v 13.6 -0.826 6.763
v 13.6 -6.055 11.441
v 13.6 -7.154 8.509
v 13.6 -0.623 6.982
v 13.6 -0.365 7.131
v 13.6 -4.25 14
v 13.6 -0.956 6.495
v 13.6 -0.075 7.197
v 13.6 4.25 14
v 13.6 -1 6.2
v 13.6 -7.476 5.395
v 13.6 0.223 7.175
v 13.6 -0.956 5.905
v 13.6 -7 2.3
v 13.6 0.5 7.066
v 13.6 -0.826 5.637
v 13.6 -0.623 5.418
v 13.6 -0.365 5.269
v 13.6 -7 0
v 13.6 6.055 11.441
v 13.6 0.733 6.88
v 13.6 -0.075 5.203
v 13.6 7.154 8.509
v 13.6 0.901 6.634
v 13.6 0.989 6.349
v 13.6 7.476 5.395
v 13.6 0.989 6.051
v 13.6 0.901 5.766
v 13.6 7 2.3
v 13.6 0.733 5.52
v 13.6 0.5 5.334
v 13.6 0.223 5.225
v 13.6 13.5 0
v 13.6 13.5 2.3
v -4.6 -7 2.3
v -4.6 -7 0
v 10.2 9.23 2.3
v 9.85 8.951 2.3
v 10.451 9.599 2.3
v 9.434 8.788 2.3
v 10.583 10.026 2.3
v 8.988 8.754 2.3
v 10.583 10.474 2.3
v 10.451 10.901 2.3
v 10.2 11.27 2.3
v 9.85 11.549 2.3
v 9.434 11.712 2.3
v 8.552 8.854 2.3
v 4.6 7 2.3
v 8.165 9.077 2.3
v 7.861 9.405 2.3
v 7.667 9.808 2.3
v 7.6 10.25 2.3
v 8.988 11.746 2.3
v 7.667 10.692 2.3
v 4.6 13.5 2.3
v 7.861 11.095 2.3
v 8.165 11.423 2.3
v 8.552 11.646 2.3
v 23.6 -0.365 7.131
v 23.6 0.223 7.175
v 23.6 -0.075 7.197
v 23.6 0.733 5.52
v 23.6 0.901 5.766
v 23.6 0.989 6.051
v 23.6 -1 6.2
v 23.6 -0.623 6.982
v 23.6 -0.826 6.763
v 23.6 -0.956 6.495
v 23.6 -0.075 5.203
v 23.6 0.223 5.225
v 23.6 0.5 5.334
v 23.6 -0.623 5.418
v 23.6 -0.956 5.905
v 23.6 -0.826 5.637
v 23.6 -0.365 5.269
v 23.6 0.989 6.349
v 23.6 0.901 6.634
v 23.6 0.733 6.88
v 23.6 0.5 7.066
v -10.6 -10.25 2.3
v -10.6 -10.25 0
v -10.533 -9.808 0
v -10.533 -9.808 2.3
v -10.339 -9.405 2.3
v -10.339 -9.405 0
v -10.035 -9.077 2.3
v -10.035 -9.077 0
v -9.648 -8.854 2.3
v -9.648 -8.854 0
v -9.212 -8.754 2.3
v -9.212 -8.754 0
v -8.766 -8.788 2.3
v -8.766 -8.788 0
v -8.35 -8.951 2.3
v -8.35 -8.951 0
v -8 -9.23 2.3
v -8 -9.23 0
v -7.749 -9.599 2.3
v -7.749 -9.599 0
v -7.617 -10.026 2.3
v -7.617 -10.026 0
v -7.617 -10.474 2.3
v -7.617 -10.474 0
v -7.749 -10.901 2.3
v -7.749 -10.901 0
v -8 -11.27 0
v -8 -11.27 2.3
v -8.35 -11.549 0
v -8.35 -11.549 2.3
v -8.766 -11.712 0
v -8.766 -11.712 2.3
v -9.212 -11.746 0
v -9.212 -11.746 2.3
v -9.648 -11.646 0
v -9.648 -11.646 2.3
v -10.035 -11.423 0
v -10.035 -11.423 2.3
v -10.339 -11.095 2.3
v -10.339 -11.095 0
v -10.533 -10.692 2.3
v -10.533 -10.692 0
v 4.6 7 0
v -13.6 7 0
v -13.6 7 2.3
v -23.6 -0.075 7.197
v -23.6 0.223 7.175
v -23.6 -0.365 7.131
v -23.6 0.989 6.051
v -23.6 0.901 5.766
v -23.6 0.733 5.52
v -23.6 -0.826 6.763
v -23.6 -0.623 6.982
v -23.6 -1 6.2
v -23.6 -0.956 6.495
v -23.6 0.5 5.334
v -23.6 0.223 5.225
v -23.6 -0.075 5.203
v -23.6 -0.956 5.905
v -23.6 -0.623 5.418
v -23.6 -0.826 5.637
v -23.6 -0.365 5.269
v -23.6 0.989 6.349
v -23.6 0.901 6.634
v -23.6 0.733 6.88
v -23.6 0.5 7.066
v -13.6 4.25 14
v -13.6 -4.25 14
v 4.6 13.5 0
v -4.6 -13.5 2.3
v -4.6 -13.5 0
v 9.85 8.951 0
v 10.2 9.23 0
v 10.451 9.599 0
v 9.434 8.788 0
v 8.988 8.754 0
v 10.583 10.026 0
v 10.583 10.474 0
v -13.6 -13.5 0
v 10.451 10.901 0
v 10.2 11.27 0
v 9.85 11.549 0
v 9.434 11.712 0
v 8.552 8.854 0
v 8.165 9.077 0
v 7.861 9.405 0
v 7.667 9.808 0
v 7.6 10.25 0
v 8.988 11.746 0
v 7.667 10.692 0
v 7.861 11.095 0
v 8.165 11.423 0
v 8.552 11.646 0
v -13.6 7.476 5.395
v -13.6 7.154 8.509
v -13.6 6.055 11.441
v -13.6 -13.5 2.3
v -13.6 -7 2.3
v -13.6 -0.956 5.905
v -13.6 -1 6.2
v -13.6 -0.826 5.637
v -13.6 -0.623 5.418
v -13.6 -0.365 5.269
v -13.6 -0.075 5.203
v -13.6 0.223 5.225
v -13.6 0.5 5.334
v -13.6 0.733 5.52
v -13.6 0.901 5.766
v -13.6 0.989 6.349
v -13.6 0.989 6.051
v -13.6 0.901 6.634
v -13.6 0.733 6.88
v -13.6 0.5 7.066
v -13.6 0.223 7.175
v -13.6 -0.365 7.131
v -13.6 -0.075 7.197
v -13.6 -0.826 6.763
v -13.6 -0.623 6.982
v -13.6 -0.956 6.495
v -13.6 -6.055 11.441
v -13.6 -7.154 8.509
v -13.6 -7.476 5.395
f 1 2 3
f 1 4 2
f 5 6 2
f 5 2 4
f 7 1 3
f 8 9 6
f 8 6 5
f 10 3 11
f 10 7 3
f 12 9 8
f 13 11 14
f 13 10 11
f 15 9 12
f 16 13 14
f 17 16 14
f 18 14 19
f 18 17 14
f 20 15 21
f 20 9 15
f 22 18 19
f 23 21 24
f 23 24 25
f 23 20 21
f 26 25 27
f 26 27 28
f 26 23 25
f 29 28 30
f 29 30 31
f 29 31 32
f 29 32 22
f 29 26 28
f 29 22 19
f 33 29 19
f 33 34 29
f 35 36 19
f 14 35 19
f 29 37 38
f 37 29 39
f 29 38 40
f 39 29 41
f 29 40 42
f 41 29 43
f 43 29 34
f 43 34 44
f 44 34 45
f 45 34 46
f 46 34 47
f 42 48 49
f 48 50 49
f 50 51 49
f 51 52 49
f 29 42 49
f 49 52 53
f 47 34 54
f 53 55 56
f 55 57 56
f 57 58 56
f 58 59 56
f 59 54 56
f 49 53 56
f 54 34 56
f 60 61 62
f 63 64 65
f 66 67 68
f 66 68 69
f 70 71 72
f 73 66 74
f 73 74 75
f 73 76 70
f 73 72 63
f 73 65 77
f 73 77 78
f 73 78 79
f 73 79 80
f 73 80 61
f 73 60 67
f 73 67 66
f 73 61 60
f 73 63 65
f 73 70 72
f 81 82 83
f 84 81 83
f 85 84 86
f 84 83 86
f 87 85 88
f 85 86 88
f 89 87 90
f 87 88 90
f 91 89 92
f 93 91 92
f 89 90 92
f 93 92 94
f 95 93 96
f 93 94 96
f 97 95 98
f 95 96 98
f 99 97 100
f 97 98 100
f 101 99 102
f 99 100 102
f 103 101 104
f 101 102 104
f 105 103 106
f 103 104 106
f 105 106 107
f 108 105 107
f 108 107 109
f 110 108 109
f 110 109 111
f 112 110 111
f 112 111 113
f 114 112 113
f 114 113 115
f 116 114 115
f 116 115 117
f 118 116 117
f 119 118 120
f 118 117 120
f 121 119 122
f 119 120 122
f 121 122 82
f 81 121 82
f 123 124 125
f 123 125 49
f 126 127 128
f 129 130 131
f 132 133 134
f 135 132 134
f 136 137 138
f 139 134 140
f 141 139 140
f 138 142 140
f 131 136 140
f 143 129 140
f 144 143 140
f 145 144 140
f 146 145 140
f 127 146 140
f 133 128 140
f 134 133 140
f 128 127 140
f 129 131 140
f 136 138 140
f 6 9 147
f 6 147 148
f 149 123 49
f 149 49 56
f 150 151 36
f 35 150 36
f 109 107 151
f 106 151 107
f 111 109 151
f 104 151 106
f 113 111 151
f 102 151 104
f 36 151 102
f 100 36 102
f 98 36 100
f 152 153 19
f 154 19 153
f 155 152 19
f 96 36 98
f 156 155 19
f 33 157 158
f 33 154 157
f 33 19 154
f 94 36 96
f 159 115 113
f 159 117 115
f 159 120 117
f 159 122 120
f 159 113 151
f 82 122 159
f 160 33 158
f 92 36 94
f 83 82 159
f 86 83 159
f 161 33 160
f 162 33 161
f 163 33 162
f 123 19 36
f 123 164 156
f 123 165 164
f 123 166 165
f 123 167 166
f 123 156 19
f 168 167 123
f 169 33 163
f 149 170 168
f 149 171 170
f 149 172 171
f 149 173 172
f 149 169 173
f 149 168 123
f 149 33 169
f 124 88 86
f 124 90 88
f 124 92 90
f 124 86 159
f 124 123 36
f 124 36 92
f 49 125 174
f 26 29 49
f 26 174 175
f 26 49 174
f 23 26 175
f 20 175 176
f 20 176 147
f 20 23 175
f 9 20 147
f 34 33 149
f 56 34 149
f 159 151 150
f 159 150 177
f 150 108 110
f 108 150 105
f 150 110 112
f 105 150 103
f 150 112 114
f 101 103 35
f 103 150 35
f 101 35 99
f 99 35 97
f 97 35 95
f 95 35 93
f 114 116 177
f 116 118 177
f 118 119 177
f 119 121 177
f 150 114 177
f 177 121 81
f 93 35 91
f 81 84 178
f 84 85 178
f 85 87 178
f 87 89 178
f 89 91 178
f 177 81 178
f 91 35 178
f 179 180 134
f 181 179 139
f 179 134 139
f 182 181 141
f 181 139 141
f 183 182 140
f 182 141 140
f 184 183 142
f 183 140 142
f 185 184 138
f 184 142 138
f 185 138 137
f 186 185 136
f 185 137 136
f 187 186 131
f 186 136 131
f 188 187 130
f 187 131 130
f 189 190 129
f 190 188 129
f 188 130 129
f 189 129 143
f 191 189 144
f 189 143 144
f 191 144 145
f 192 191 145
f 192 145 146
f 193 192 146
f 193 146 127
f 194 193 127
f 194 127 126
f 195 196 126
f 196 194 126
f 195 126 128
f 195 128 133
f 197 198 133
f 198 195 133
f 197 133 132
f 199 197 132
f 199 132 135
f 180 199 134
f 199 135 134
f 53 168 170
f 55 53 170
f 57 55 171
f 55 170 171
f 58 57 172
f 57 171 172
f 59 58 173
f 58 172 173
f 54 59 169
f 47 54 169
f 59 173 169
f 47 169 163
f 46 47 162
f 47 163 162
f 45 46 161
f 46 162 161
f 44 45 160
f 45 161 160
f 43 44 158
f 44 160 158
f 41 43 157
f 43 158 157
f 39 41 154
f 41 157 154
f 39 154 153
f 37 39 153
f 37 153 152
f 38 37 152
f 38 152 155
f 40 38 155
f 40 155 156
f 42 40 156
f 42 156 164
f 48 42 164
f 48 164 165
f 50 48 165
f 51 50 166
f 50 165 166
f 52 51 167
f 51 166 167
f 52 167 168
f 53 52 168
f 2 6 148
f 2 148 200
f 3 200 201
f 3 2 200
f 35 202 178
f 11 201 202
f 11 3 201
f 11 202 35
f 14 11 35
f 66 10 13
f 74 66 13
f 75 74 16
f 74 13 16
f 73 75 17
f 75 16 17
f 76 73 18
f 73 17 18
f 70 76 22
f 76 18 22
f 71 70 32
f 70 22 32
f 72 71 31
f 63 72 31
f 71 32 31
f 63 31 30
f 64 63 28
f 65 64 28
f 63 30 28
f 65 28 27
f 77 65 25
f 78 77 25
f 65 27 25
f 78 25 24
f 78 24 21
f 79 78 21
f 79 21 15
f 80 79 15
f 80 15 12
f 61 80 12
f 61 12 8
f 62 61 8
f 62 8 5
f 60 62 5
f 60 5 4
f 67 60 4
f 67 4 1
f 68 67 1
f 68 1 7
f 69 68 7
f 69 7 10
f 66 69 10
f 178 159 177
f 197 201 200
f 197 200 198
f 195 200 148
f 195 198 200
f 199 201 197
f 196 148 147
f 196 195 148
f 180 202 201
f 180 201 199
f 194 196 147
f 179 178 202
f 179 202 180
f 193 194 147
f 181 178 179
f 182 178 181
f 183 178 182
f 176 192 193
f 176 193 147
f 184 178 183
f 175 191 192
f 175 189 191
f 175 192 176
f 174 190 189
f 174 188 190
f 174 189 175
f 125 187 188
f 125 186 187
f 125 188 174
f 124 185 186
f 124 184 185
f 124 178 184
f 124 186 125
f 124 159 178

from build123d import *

# Parameters (mm, degrees)
SKETCH_1_W           = 27.2
SKETCH_1_H           = 14
EXTRUDE_1_DEPTH      = 2.3
SKETCH_2_W           = 9
SKETCH_2_H           = 6.5
SKETCH_2_R           = 1.5
EXTRUDE_2_DEPTH      = 2.3
EXTRUDE_3_REACH      = 32.453
EXTRUDE_4_DEPTH      = 23.6
EXTRUDE_4_DEPTH_BACK = 23.6
SKETCH_5_R           = 1


with BuildPart() as part:
    # 草图1 → 拉伸1 (new body)
    with BuildSketch(Plane.XY):
        Rectangle(SKETCH_1_W, SKETCH_1_H)
    extrude(amount=EXTRUDE_1_DEPTH)

    # 草图2 → 拉伸2 (add)
    # profile 1 of 2: a face of its own
    with BuildSketch(Plane(origin=(0, 0, 0), x_dir=(-1, 0, 0), z_dir=(0, 0, -1))):
        with Locations((9.1, -10.25)):
            Rectangle(SKETCH_2_W, SKETCH_2_H)
        with Locations((9.1, -10.25)):
            Circle(SKETCH_2_R, mode=Mode.SUBTRACT)
    # profile 2 of 2: a face of its own
    with BuildSketch(Plane(origin=(0, 0, 0), x_dir=(-1, 0, 0), z_dir=(0, 0, -1))):
        with Locations((-9.1, 10.25)):
            Rectangle(SKETCH_2_W, SKETCH_2_H)
        with Locations((-9.1, 10.25)):
            Circle(SKETCH_2_R, mode=Mode.SUBTRACT)
    extrude(amount=-EXTRUDE_2_DEPTH)

    # 拉伸3: up to this face of the body (flat: up to its plane)
    extrude_3_end = Plane(part.part.faces().sort_by_distance((-13.6, -3.25, 1.15))[0])
    # 草图4 → 拉伸3 (add, up to the picked face)
    with BuildSketch(Plane(origin=(13.6, 0, 0), x_dir=(0, 0, -1), z_dir=(1, 0, 0)), mode=Mode.PRIVATE) as extrude_3_sk1:
        with BuildLine():
            Line((-2.3, -7), (-2.3, 7))
            ThreePointArc((-2.3, 7), (-8.509289243, 7.153612414), (-14, 4.25))
            Line((-14, 4.25), (-14, -4.25))
            ThreePointArc((-14, -4.25), (-8.509289243, -7.153612414), (-2.3, -7))
        make_face()
    extrude_3_tool1 = split(extrude(extrude_3_sk1.sketch, amount=-EXTRUDE_3_REACH, mode=Mode.PRIVATE), bisect_by=extrude_3_end, keep=Keep.BOTH, mode=Mode.PRIVATE)
    add(extrude_3_tool1.solids().sort_by(Axis((13.6, 0, 7.774162), (-1, 0, 0)))[0])

    # 草图5 → 拉伸4 (add, two sides: drawn at the far end of the back side and taken through both)
    with BuildSketch(Plane(origin=(0, 0, 0), x_dir=(0, 0, -1), z_dir=(1, 0, 0)).offset(-EXTRUDE_4_DEPTH_BACK)):
        with Locations(Location((-6.2, 0, 0), (0, 0, 270))):
            Circle(SKETCH_5_R)
    extrude(amount=EXTRUDE_4_DEPTH + EXTRUDE_4_DEPTH_BACK)


solid = part.part
